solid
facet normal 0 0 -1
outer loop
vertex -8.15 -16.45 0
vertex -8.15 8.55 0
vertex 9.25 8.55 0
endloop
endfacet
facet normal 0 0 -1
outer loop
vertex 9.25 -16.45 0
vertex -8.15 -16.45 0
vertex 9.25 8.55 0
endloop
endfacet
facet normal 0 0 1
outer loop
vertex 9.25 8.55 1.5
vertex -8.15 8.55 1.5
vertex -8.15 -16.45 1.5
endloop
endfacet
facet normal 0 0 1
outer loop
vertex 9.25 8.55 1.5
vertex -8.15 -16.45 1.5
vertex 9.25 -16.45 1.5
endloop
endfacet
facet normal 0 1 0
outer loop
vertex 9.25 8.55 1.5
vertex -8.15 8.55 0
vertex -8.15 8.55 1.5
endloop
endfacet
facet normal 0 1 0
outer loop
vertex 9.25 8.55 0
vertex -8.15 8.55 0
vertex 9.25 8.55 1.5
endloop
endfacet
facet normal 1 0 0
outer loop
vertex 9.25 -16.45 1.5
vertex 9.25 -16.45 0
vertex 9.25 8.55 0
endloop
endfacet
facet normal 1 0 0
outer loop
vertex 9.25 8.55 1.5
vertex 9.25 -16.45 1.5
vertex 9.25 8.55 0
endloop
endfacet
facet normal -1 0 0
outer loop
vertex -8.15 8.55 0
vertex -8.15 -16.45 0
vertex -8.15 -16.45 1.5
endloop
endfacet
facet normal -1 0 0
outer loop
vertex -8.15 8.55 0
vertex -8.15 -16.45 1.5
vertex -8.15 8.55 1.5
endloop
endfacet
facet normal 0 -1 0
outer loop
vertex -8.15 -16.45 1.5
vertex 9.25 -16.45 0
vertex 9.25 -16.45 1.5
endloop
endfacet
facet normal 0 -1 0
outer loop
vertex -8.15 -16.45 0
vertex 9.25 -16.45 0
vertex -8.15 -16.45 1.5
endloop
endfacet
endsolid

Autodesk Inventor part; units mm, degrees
ref_plane "YZ Plane" through (0, 0, 0) normal (1, 0, 0) x (0, 1, 0)
ref_plane "XZ Plane" through (0, 0, 0) normal (0, 1, 0) x (-1, 0, 0)
ref_plane "XY Plane" through (0, 0, 0) normal (0, 0, 1) x (1, 0, 0)
sketch "Skizze1" plane through (0, 0, 0) normal (0, 0, 1) x (1, 0, 0)
  line L0 (-9.25, -6.8) -> (-9.25, 6.8) projected
  line L1 (9.25, -6.8) -> (-9.25, -6.8) projected
  line L2 (9.25, 6.8) -> (9.25, -6.8) projected
  line L3 (-9.25, 6.8) -> (9.25, 6.8) projected
  line L4 (12.85, -16.45) -> (-8.15, -16.45)
  line L5 (-8.15, -16.45) -> (-8.15, 8.55)
  line L6 (-8.15, 8.55) -> (12.85, 8.55)
  line L7 (12.85, 8.55) -> (12.85, -16.45)
  point P0 (0, 0)
  dimension "d0" = 21
  dimension "d1" = 25
  dimension "d2" = 3.6
  dimension "d6" = 1.75
extrude "Extrusion1" add sketch "Skizze1" along normal blind 1.5 contours L5 L3 L2 L1 | L1 L2 L3 L5 L6 L7 L4
sketch "Skizze2" plane through (0, 0, 1.5) normal (0, 0, 1) x (1, 0, 0)
  line L0 (9.25, -6.8) -> (-9.25, -6.8) projected
  line L1 (-8.15, -16.45) -> (12.85, -16.45) projected
  line L2 (12.85, -16.45) -> (12.85, 8.55) projected
  line L3 (12.85, 8.55) -> (-8.15, 8.55) projected
  line L4 (-8.15, 8.55) -> (-8.15, -16.45) projected
  line L5 (9.25, 6.8) -> (9.25, -6.8) projected
  line L6 (12.85, -16.45) -> (12.85, 8.55) projected
  line L7 (12.85, 8.55) -> (9.25, 8.55)
  line L8 (9.25, 8.55) -> (9.25, -6.8)
  line L9 (9.25, -6.8) -> (12.85, -6.8)
  line L10 (12.85, -6.8) -> (12.85, 8.55)
  point P0 (0, 0)
extrude "Extrusion2" cut sketch "Skizze2" against normal blind 10 contours L5 L8 L3 L2 L9
sketch "Skizze3" plane through (0, 0, 0) normal (0, 0, -1) x (-1, 0, 0)
  line L0 (-9.25, 8.55) -> (-9.25, -6.8) projected
  line L1 (-9.25, -6.8) -> (-12.85, -6.8) projected
  line L2 (-12.85, -16.45) -> (-12.85, -6.8) projected
  line L3 (8.15, -16.45) -> (-12.85, -16.45) projected
  line L4 (8.15, 8.55) -> (8.15, -16.45) projected
  line L5 (-9.25, 8.55) -> (8.15, 8.55) projected
  line L6 (-12.85, -16.45) -> (-9.25, -16.45)
  line L7 (-9.25, -16.45) -> (-9.25, -6.8)
  line L8 (-9.25, -6.8) -> (-12.85, -6.8)
  line L9 (-12.85, -6.8) -> (-12.85, -16.45)
  point P0 (0, 0)
extrude "Extrusion3" cut sketch "Skizze3" against normal blind 10 contours L7 L3 L2 L1
properties part number "00_Huawei_P30_Lens_Adapterpcb"
